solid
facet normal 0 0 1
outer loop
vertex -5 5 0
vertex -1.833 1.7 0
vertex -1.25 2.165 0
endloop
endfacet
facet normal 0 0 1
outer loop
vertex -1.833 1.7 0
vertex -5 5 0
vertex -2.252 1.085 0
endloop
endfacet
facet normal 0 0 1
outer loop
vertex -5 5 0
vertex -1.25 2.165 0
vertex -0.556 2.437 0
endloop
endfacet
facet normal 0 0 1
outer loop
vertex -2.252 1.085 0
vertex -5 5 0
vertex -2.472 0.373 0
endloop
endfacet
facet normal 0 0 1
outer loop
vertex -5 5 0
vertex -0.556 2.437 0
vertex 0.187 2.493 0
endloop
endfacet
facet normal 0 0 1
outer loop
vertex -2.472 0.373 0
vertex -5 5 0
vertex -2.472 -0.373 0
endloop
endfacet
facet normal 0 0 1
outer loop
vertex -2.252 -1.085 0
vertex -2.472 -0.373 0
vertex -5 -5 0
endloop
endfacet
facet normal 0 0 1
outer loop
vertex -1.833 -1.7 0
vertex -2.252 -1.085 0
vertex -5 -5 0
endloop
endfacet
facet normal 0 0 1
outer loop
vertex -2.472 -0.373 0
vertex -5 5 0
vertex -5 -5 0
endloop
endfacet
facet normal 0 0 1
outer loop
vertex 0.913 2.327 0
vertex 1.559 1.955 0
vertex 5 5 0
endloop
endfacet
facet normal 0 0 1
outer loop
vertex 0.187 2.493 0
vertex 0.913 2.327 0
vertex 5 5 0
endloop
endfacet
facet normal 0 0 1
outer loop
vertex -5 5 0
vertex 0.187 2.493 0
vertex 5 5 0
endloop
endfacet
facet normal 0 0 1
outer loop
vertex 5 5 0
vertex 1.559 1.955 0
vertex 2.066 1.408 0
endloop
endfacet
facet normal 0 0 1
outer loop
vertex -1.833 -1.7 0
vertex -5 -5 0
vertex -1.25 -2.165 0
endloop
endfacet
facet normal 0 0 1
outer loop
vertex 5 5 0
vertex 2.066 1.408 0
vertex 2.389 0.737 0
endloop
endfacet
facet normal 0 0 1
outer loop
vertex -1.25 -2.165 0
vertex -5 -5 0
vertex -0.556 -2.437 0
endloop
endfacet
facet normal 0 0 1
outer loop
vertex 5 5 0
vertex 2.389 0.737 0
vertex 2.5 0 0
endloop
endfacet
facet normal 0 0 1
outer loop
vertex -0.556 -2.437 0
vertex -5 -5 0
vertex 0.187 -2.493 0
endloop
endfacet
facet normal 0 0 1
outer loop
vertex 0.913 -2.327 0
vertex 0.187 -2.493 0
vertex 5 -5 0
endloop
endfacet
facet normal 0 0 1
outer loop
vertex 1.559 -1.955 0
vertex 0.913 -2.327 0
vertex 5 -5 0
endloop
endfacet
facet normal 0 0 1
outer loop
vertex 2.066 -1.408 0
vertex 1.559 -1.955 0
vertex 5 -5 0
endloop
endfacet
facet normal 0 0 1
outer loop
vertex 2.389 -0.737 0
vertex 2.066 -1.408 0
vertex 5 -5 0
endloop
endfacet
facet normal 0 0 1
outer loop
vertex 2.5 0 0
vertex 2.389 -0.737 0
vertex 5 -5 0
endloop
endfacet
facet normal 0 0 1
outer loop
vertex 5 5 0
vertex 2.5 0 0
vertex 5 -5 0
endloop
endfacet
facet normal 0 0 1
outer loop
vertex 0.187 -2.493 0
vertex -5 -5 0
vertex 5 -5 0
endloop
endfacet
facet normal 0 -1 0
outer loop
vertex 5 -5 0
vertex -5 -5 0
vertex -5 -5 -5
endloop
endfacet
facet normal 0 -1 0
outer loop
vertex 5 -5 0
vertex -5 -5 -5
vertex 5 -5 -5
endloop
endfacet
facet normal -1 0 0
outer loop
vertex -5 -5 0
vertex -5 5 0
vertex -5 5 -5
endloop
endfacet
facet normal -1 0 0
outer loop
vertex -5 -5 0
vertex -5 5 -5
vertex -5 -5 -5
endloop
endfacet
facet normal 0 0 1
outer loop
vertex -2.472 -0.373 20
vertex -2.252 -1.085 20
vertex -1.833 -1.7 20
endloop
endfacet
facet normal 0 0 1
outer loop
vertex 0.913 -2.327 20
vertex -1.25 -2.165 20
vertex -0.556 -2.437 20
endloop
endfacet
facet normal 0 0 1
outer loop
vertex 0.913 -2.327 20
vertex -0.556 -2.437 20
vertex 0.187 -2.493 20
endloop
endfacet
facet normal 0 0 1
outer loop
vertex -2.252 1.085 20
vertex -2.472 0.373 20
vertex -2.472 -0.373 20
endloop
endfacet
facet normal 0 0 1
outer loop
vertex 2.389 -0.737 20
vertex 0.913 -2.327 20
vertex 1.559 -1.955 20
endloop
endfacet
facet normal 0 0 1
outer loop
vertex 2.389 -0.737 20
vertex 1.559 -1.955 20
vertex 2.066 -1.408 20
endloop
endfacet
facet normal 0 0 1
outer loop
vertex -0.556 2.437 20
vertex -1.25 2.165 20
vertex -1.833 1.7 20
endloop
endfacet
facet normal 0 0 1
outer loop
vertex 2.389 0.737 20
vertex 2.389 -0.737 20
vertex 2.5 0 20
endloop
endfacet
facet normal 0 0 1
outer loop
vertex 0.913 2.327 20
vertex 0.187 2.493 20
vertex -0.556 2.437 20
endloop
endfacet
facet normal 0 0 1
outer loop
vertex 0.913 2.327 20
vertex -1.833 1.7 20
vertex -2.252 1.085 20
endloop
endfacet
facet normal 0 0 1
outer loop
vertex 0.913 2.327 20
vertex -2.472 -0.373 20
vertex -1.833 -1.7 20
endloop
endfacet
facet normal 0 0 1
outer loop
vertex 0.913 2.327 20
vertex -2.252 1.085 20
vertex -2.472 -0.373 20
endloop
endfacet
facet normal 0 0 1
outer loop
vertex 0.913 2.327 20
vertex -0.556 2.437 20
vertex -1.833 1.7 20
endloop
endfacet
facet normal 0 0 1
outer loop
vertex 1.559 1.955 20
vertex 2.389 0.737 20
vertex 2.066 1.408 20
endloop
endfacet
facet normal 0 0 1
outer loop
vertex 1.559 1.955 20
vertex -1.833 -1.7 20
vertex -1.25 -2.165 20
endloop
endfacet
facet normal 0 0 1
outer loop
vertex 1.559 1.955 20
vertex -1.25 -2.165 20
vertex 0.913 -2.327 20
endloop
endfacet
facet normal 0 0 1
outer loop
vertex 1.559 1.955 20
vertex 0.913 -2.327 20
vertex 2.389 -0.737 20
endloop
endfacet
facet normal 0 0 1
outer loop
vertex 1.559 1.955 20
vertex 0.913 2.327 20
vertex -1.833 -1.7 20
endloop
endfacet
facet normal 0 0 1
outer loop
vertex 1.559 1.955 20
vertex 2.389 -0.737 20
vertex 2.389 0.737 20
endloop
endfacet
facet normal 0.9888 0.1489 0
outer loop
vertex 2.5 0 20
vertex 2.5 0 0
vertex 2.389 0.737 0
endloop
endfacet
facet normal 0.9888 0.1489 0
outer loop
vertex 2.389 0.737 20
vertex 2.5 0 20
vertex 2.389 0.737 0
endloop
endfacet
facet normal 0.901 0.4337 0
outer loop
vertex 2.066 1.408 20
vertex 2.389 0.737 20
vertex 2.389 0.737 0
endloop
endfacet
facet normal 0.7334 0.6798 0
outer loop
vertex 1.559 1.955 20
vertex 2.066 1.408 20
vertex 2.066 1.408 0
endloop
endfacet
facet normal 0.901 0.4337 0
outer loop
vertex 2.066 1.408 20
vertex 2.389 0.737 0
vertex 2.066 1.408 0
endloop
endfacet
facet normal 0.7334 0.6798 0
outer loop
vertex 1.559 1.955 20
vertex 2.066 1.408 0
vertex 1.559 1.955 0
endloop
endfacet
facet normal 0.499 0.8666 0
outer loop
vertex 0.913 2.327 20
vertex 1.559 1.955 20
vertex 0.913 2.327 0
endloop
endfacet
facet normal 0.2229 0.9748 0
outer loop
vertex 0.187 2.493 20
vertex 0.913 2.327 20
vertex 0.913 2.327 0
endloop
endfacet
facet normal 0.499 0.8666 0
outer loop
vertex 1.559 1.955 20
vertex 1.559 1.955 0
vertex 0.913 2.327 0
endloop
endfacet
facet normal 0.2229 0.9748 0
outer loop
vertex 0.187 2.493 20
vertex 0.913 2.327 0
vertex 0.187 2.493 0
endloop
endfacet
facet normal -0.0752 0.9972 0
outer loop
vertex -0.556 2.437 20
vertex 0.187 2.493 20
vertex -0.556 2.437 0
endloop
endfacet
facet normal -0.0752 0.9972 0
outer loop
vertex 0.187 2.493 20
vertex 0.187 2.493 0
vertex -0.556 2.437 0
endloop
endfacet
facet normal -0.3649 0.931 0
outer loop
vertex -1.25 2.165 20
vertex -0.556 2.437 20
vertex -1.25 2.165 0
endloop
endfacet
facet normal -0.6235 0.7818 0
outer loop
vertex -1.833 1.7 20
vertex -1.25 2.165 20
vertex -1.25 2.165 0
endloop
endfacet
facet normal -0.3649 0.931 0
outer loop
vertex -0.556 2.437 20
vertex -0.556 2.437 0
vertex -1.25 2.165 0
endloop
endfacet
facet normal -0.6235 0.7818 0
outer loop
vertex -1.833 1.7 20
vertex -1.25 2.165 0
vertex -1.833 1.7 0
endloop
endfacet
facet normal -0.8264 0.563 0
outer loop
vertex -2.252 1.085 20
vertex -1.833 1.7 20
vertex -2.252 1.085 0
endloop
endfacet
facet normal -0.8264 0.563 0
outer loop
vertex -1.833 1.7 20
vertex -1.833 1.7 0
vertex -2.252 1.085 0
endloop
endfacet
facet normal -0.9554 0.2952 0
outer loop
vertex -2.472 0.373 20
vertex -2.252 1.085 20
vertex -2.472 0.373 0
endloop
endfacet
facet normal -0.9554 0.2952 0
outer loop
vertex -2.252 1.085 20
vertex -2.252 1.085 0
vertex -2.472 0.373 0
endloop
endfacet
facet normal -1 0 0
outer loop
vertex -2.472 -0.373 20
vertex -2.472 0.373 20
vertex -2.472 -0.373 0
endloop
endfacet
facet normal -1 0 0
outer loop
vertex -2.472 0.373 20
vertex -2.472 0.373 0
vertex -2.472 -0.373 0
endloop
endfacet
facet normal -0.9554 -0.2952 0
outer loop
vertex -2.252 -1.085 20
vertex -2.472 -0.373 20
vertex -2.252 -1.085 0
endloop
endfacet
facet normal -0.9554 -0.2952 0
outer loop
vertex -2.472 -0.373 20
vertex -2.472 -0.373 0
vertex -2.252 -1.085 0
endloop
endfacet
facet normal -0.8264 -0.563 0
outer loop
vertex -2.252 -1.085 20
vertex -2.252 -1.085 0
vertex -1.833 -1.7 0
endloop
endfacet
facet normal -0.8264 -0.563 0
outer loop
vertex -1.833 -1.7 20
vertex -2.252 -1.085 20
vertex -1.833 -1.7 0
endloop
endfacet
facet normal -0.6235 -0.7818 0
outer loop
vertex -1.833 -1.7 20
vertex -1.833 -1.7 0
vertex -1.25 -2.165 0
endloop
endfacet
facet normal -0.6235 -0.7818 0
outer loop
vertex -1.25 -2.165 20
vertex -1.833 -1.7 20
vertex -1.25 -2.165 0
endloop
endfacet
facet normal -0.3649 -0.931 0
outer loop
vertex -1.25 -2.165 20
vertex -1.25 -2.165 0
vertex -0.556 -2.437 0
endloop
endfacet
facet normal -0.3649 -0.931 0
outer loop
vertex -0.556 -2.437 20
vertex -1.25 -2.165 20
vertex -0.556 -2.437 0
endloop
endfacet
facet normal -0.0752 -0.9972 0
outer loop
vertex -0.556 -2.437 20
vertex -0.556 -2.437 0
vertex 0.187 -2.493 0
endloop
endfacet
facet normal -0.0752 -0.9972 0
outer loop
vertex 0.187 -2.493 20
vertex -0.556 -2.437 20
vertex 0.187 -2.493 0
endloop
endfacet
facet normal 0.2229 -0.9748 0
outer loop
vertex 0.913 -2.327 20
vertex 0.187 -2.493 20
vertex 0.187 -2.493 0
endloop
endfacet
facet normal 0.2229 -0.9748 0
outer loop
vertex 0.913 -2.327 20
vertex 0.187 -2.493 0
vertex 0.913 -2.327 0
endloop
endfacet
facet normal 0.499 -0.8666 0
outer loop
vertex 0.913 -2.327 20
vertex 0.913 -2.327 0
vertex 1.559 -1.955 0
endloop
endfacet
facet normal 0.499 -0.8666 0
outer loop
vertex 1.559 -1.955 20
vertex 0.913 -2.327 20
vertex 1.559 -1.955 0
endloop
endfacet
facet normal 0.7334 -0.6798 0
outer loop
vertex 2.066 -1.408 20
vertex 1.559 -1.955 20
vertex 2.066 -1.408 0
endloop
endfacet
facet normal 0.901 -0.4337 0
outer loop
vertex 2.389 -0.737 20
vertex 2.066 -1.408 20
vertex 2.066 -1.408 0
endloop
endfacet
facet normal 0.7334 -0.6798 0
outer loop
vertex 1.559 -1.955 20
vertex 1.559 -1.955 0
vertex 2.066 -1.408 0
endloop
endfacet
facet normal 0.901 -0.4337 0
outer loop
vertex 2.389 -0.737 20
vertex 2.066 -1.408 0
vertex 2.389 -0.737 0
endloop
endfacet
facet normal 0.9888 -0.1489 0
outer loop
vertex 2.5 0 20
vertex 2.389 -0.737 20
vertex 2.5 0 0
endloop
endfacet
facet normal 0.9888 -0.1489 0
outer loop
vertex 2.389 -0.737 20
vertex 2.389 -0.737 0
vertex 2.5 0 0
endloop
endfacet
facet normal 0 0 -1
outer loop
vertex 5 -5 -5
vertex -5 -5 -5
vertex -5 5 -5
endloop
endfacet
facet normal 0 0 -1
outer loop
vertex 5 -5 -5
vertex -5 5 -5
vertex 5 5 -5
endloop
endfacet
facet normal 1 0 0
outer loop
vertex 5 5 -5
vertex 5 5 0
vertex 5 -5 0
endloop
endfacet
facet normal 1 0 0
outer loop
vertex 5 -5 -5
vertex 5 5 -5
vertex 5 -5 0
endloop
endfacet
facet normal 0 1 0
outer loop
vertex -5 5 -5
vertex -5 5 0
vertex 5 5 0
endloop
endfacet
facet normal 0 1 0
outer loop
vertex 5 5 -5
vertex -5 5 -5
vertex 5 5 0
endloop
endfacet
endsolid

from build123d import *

# Parameters (mm, degrees)
F0_R     = 2.5
F1_DEPTH = 20
F2_W     = 10
F2_H     = 10
F3_DEPTH = 5


with BuildPart() as f1:
    # F0 (on Top) → F1 (new body)
    with BuildSketch(Plane.XY):
        Circle(F0_R)
    extrude(amount=F1_DEPTH)

    # F2 (on face) → F3 (join)
    with BuildSketch(Plane(origin=(0, 0, 0), x_dir=(1, 0, 0), z_dir=(0, 0, -1))):
        Rectangle(F2_W, F2_H)
    extrude(amount=F3_DEPTH)


solid = f1.part
